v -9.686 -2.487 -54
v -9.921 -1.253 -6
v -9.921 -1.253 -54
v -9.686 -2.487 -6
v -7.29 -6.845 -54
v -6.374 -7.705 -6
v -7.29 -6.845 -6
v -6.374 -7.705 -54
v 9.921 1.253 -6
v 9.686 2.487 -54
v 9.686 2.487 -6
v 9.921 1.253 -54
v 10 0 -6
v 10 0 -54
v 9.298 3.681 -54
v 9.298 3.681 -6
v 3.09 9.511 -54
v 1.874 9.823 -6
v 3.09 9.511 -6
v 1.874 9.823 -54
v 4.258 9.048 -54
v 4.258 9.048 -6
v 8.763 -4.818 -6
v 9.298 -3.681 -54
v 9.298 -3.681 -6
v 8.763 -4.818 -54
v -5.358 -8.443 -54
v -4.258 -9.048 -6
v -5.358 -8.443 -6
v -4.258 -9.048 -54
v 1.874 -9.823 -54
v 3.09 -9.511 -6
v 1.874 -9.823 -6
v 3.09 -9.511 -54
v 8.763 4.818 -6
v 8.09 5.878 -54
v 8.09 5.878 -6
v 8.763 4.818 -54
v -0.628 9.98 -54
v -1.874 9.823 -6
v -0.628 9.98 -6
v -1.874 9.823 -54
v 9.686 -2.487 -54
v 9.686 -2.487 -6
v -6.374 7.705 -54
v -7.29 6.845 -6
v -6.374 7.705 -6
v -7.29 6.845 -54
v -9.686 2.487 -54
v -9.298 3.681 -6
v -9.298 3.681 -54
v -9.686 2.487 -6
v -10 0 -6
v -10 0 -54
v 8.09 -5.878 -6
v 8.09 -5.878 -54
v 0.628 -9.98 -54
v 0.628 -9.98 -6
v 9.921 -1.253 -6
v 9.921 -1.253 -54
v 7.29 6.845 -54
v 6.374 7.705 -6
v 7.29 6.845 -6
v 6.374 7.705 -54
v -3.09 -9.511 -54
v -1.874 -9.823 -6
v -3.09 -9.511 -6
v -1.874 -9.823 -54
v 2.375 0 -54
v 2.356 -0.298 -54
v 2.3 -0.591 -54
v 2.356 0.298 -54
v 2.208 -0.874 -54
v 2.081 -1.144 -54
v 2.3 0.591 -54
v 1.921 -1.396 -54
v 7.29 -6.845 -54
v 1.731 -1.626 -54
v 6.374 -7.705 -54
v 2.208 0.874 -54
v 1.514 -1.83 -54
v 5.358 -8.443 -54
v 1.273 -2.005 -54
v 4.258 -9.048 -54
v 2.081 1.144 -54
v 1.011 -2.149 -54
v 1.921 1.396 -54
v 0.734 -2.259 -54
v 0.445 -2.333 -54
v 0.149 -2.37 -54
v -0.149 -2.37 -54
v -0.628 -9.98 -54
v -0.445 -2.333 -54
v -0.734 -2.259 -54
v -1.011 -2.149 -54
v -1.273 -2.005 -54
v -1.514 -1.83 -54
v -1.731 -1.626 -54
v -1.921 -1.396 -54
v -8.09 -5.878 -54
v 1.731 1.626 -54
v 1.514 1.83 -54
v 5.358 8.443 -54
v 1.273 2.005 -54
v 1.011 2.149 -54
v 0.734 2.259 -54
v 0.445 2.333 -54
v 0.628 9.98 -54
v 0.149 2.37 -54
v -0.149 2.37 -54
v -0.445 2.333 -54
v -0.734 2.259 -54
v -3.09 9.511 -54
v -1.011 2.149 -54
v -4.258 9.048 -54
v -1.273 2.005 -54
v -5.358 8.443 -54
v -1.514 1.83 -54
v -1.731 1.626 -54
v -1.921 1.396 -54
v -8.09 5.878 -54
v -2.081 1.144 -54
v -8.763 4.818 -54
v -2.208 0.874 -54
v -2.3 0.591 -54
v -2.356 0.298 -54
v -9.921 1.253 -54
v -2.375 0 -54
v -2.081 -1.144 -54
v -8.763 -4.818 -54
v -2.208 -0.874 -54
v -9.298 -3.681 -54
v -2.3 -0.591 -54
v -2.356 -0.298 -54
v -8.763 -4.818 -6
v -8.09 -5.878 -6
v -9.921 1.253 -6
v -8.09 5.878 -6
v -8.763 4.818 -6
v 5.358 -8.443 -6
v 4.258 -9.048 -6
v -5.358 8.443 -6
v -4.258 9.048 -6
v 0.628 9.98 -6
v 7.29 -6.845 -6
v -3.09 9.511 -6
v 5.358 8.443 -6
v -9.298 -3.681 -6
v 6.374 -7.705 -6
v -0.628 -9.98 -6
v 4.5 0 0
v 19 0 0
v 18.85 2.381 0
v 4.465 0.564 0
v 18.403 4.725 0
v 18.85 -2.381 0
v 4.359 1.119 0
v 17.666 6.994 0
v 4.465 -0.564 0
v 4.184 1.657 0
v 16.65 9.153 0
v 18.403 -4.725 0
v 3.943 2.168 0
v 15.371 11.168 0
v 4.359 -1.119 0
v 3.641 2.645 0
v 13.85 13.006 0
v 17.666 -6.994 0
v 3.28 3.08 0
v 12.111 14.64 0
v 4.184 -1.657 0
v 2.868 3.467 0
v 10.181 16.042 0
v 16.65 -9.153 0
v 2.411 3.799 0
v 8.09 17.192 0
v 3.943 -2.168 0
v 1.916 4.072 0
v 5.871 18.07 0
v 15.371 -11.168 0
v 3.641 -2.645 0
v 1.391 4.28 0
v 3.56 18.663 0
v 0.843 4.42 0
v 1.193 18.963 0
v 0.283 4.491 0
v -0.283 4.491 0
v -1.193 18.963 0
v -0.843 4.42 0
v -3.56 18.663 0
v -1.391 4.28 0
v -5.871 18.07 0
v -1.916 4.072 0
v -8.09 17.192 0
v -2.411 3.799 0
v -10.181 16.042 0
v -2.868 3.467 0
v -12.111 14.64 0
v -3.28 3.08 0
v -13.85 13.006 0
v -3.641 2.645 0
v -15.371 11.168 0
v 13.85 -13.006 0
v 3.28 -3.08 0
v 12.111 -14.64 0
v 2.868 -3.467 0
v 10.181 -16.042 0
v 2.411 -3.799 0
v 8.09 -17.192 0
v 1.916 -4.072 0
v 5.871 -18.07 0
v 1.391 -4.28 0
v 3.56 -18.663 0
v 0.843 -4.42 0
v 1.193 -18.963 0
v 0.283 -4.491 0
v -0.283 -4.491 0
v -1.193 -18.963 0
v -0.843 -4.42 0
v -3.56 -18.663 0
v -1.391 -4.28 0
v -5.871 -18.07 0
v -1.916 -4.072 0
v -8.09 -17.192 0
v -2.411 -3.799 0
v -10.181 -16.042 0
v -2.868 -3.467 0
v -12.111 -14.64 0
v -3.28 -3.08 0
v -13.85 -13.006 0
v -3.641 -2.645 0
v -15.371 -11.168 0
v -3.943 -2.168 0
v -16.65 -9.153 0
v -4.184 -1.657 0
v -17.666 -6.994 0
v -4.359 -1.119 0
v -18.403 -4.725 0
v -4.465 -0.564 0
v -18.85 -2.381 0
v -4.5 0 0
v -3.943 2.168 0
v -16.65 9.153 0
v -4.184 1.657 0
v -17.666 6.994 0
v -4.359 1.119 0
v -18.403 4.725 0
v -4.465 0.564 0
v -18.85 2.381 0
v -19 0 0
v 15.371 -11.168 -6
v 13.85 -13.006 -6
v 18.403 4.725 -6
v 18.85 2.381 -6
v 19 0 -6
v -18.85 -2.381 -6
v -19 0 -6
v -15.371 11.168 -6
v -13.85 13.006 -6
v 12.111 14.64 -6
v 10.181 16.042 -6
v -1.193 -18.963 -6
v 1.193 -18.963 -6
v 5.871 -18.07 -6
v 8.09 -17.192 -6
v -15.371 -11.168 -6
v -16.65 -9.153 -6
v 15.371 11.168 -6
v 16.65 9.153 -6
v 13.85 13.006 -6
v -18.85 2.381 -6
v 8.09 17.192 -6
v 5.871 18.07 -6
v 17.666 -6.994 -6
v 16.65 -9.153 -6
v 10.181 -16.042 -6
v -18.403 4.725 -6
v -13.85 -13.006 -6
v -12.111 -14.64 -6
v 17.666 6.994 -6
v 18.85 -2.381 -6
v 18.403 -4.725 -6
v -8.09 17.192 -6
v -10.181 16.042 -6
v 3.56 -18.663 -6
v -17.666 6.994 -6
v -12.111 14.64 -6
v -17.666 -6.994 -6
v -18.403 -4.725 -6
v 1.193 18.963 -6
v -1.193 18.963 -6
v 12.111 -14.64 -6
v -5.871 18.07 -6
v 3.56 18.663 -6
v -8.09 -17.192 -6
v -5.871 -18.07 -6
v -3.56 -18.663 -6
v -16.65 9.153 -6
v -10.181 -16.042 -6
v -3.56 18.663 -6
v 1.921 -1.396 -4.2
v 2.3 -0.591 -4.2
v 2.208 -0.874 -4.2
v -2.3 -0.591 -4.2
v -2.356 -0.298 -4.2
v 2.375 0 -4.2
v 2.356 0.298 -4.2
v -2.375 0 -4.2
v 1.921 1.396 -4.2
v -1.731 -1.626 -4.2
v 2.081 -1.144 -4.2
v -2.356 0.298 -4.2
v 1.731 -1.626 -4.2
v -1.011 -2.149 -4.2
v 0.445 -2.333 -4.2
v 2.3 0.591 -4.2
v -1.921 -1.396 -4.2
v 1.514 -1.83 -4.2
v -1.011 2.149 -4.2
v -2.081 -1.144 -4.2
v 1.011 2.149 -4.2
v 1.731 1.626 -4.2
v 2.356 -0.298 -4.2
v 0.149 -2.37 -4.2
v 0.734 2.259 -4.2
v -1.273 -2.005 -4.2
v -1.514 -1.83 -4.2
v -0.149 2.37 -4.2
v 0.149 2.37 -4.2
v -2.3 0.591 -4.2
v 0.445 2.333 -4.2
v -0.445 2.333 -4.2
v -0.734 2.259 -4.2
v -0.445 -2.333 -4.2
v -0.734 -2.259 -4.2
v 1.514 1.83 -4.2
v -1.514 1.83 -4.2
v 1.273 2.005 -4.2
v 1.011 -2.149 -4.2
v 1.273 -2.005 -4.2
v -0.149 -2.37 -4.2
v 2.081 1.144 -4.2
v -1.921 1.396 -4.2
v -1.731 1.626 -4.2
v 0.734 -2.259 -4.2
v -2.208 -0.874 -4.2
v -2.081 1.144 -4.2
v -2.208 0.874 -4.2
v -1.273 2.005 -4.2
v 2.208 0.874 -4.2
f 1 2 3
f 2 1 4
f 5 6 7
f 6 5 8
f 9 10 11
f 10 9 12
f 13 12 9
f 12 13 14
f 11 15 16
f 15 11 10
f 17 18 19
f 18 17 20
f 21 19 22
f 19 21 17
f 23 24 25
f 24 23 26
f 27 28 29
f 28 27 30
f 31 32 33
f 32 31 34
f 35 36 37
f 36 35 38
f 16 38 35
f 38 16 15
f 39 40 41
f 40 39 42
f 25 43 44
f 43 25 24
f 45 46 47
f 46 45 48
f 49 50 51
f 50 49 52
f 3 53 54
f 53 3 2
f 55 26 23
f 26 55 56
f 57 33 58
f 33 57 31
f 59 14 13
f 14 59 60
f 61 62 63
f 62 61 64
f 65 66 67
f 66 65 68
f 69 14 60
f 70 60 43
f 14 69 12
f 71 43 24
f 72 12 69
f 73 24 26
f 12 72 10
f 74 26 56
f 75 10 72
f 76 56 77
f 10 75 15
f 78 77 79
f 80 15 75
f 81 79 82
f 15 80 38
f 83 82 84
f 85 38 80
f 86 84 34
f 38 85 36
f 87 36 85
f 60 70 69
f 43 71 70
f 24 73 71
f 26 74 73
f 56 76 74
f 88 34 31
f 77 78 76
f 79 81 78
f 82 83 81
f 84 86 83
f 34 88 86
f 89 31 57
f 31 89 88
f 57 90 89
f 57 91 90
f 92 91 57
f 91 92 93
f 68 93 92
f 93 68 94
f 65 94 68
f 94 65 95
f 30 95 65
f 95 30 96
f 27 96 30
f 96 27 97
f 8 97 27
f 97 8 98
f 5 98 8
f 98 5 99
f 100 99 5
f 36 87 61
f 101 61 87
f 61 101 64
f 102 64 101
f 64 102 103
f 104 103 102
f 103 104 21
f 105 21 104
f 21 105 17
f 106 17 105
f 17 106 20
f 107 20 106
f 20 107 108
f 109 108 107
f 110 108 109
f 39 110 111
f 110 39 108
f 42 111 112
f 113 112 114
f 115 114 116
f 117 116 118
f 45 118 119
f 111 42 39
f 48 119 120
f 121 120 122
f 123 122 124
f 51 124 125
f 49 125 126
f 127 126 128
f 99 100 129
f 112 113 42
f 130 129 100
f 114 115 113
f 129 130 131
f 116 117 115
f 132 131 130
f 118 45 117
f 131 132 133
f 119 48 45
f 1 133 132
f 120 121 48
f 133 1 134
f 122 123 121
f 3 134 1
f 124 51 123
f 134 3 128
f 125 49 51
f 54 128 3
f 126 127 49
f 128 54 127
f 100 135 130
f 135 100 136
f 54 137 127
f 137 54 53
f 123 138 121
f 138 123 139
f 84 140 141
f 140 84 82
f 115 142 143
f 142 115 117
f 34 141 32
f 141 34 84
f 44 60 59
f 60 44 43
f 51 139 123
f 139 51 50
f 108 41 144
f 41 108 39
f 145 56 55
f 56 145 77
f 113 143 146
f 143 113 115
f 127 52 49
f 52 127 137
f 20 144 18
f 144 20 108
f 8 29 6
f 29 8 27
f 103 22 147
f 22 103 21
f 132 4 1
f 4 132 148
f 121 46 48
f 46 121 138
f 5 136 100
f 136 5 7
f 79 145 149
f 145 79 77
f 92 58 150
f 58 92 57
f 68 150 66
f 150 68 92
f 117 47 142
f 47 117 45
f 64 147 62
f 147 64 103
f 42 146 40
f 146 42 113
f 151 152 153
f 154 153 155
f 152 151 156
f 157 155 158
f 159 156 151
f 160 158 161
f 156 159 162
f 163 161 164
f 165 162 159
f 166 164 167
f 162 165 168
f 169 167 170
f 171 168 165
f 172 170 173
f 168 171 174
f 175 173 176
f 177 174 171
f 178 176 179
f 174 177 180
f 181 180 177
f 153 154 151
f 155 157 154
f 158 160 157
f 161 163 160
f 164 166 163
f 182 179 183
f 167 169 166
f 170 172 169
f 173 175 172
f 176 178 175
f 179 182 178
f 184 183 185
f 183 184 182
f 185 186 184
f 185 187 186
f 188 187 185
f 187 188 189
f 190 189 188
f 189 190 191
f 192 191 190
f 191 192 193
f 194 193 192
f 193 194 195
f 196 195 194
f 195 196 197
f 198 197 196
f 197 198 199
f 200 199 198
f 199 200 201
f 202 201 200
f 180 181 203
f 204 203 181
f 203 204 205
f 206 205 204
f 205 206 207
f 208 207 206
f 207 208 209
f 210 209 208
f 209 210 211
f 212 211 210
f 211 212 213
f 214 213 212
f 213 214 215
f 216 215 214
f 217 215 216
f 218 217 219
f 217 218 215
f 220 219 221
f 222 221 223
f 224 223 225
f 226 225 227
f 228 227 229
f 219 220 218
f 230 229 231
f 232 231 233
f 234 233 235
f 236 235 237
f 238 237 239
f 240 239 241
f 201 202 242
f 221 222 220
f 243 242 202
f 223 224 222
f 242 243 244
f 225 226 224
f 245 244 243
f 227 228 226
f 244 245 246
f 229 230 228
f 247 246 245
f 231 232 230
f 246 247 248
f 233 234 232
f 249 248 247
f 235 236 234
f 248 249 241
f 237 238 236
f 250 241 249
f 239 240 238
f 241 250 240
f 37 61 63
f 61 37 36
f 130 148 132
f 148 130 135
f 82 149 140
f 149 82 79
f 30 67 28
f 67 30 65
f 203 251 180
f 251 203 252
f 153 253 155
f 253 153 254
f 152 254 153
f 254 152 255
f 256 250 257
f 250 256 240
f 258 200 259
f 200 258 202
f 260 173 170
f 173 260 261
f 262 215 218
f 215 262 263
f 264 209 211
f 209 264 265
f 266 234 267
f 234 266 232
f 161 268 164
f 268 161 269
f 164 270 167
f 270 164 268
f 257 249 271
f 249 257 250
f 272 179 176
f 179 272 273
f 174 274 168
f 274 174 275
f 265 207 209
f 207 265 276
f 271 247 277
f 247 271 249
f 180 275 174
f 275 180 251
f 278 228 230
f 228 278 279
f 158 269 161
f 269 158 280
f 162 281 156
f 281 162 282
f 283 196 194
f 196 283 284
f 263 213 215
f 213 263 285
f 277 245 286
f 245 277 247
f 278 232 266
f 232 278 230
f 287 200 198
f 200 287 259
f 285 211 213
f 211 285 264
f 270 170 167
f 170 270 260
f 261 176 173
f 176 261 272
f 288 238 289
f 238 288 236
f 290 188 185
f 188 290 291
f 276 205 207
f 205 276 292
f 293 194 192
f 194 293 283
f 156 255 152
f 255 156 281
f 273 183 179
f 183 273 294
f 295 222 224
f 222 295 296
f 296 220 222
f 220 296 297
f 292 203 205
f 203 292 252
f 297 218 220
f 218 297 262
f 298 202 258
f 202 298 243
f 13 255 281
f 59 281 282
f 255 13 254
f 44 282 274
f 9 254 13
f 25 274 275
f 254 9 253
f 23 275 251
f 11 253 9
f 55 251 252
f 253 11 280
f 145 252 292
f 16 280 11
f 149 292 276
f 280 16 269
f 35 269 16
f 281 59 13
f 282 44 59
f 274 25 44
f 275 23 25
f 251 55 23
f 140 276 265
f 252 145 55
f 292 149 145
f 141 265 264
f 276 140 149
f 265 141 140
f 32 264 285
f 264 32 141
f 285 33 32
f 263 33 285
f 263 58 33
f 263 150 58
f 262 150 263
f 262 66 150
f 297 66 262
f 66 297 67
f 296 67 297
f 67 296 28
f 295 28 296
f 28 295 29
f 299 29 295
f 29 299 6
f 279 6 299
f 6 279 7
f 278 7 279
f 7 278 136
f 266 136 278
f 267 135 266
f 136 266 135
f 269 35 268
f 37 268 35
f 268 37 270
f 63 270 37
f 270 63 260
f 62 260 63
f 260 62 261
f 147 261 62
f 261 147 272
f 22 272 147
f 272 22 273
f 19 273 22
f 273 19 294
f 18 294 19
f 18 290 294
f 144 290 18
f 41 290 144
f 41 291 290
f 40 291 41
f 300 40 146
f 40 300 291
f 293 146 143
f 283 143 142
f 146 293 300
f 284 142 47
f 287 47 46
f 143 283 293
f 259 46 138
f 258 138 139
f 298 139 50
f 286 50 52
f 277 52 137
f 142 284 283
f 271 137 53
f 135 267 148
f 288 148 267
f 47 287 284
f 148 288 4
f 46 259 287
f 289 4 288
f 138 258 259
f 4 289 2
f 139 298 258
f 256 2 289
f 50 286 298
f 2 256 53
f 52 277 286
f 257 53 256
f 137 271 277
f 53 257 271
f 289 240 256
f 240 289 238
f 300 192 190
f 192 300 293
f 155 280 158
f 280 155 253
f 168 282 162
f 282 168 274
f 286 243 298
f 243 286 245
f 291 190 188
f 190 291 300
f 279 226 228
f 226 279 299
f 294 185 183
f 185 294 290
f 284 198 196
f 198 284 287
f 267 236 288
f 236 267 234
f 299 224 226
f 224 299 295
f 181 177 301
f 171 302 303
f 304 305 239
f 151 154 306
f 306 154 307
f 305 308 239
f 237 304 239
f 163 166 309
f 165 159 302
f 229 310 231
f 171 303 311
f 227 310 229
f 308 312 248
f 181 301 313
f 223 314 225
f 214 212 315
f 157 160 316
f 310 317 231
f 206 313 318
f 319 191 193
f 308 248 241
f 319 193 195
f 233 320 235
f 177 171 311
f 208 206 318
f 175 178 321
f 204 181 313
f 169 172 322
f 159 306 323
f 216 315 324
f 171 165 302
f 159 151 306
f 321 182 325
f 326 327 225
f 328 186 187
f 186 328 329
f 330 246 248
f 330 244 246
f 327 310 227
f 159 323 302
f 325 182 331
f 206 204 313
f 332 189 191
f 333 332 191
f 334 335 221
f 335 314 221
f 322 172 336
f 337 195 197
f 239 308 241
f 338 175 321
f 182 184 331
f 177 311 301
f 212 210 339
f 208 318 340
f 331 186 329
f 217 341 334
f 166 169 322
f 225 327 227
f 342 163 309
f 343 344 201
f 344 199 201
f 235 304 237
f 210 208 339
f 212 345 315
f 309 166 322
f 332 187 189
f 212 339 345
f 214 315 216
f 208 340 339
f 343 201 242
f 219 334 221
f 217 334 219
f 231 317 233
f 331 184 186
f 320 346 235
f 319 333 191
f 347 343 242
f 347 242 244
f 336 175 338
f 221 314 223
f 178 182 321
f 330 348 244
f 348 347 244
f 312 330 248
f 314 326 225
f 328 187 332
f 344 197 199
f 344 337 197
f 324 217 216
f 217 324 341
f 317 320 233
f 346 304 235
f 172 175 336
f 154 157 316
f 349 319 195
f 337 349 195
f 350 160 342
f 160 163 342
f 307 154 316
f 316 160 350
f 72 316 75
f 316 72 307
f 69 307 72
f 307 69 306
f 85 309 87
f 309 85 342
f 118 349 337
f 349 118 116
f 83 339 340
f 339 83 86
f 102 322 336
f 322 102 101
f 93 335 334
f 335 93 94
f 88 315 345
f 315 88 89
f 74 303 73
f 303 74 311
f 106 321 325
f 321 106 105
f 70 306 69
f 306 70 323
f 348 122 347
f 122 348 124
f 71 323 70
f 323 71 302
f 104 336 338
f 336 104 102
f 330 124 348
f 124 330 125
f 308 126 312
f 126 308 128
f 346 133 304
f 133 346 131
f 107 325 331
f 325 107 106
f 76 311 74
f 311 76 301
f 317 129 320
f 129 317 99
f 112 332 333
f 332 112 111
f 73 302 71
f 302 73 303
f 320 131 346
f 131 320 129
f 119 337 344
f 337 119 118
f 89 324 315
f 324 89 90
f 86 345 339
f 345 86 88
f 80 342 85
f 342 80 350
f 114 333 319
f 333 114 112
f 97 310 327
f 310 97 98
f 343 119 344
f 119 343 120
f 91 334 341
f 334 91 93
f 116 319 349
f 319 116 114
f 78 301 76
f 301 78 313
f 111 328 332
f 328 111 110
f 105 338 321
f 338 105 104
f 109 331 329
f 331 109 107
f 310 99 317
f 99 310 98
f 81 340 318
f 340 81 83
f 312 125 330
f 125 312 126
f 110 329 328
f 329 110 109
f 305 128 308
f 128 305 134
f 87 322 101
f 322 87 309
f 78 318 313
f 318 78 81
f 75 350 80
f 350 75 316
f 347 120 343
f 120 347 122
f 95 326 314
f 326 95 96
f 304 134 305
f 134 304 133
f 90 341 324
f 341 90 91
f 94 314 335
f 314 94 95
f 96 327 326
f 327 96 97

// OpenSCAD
$fn = 50;


difference() {
	union() {
		translate(v = [0, 0, -54.0000000000]) {
			cylinder(h = 54, r = 10.0000000000);
		}
		translate(v = [0, 0, -6.0000000000]) {
			cylinder(h = 6, r = 19.0000000000);
		}
	}
	union() {
		translate(v = [0, 0, 0]) {
			rotate(a = [0, 0, 0]) {
				difference() {
					union() {
						#translate(v = [0, 0, -54.0000000000]) {
							cylinder(h = 54, r = 2.2500000000);
						}
						#translate(v = [0, 0, -4.2000000000]) {
							cylinder(h = 4.2000000000, r1 = 2.3750000000, r2 = 4.5000000000);
						}
						#translate(v = [0, 0, -54.0000000000]) {
							cylinder(h = 54, r = 2.3750000000);
						}
						#translate(v = [0, 0, -54.0000000000]) {
							cylinder(h = 54, r = 2.2500000000);
						}
					}
					union();
				}
			}
		}
	}
}
